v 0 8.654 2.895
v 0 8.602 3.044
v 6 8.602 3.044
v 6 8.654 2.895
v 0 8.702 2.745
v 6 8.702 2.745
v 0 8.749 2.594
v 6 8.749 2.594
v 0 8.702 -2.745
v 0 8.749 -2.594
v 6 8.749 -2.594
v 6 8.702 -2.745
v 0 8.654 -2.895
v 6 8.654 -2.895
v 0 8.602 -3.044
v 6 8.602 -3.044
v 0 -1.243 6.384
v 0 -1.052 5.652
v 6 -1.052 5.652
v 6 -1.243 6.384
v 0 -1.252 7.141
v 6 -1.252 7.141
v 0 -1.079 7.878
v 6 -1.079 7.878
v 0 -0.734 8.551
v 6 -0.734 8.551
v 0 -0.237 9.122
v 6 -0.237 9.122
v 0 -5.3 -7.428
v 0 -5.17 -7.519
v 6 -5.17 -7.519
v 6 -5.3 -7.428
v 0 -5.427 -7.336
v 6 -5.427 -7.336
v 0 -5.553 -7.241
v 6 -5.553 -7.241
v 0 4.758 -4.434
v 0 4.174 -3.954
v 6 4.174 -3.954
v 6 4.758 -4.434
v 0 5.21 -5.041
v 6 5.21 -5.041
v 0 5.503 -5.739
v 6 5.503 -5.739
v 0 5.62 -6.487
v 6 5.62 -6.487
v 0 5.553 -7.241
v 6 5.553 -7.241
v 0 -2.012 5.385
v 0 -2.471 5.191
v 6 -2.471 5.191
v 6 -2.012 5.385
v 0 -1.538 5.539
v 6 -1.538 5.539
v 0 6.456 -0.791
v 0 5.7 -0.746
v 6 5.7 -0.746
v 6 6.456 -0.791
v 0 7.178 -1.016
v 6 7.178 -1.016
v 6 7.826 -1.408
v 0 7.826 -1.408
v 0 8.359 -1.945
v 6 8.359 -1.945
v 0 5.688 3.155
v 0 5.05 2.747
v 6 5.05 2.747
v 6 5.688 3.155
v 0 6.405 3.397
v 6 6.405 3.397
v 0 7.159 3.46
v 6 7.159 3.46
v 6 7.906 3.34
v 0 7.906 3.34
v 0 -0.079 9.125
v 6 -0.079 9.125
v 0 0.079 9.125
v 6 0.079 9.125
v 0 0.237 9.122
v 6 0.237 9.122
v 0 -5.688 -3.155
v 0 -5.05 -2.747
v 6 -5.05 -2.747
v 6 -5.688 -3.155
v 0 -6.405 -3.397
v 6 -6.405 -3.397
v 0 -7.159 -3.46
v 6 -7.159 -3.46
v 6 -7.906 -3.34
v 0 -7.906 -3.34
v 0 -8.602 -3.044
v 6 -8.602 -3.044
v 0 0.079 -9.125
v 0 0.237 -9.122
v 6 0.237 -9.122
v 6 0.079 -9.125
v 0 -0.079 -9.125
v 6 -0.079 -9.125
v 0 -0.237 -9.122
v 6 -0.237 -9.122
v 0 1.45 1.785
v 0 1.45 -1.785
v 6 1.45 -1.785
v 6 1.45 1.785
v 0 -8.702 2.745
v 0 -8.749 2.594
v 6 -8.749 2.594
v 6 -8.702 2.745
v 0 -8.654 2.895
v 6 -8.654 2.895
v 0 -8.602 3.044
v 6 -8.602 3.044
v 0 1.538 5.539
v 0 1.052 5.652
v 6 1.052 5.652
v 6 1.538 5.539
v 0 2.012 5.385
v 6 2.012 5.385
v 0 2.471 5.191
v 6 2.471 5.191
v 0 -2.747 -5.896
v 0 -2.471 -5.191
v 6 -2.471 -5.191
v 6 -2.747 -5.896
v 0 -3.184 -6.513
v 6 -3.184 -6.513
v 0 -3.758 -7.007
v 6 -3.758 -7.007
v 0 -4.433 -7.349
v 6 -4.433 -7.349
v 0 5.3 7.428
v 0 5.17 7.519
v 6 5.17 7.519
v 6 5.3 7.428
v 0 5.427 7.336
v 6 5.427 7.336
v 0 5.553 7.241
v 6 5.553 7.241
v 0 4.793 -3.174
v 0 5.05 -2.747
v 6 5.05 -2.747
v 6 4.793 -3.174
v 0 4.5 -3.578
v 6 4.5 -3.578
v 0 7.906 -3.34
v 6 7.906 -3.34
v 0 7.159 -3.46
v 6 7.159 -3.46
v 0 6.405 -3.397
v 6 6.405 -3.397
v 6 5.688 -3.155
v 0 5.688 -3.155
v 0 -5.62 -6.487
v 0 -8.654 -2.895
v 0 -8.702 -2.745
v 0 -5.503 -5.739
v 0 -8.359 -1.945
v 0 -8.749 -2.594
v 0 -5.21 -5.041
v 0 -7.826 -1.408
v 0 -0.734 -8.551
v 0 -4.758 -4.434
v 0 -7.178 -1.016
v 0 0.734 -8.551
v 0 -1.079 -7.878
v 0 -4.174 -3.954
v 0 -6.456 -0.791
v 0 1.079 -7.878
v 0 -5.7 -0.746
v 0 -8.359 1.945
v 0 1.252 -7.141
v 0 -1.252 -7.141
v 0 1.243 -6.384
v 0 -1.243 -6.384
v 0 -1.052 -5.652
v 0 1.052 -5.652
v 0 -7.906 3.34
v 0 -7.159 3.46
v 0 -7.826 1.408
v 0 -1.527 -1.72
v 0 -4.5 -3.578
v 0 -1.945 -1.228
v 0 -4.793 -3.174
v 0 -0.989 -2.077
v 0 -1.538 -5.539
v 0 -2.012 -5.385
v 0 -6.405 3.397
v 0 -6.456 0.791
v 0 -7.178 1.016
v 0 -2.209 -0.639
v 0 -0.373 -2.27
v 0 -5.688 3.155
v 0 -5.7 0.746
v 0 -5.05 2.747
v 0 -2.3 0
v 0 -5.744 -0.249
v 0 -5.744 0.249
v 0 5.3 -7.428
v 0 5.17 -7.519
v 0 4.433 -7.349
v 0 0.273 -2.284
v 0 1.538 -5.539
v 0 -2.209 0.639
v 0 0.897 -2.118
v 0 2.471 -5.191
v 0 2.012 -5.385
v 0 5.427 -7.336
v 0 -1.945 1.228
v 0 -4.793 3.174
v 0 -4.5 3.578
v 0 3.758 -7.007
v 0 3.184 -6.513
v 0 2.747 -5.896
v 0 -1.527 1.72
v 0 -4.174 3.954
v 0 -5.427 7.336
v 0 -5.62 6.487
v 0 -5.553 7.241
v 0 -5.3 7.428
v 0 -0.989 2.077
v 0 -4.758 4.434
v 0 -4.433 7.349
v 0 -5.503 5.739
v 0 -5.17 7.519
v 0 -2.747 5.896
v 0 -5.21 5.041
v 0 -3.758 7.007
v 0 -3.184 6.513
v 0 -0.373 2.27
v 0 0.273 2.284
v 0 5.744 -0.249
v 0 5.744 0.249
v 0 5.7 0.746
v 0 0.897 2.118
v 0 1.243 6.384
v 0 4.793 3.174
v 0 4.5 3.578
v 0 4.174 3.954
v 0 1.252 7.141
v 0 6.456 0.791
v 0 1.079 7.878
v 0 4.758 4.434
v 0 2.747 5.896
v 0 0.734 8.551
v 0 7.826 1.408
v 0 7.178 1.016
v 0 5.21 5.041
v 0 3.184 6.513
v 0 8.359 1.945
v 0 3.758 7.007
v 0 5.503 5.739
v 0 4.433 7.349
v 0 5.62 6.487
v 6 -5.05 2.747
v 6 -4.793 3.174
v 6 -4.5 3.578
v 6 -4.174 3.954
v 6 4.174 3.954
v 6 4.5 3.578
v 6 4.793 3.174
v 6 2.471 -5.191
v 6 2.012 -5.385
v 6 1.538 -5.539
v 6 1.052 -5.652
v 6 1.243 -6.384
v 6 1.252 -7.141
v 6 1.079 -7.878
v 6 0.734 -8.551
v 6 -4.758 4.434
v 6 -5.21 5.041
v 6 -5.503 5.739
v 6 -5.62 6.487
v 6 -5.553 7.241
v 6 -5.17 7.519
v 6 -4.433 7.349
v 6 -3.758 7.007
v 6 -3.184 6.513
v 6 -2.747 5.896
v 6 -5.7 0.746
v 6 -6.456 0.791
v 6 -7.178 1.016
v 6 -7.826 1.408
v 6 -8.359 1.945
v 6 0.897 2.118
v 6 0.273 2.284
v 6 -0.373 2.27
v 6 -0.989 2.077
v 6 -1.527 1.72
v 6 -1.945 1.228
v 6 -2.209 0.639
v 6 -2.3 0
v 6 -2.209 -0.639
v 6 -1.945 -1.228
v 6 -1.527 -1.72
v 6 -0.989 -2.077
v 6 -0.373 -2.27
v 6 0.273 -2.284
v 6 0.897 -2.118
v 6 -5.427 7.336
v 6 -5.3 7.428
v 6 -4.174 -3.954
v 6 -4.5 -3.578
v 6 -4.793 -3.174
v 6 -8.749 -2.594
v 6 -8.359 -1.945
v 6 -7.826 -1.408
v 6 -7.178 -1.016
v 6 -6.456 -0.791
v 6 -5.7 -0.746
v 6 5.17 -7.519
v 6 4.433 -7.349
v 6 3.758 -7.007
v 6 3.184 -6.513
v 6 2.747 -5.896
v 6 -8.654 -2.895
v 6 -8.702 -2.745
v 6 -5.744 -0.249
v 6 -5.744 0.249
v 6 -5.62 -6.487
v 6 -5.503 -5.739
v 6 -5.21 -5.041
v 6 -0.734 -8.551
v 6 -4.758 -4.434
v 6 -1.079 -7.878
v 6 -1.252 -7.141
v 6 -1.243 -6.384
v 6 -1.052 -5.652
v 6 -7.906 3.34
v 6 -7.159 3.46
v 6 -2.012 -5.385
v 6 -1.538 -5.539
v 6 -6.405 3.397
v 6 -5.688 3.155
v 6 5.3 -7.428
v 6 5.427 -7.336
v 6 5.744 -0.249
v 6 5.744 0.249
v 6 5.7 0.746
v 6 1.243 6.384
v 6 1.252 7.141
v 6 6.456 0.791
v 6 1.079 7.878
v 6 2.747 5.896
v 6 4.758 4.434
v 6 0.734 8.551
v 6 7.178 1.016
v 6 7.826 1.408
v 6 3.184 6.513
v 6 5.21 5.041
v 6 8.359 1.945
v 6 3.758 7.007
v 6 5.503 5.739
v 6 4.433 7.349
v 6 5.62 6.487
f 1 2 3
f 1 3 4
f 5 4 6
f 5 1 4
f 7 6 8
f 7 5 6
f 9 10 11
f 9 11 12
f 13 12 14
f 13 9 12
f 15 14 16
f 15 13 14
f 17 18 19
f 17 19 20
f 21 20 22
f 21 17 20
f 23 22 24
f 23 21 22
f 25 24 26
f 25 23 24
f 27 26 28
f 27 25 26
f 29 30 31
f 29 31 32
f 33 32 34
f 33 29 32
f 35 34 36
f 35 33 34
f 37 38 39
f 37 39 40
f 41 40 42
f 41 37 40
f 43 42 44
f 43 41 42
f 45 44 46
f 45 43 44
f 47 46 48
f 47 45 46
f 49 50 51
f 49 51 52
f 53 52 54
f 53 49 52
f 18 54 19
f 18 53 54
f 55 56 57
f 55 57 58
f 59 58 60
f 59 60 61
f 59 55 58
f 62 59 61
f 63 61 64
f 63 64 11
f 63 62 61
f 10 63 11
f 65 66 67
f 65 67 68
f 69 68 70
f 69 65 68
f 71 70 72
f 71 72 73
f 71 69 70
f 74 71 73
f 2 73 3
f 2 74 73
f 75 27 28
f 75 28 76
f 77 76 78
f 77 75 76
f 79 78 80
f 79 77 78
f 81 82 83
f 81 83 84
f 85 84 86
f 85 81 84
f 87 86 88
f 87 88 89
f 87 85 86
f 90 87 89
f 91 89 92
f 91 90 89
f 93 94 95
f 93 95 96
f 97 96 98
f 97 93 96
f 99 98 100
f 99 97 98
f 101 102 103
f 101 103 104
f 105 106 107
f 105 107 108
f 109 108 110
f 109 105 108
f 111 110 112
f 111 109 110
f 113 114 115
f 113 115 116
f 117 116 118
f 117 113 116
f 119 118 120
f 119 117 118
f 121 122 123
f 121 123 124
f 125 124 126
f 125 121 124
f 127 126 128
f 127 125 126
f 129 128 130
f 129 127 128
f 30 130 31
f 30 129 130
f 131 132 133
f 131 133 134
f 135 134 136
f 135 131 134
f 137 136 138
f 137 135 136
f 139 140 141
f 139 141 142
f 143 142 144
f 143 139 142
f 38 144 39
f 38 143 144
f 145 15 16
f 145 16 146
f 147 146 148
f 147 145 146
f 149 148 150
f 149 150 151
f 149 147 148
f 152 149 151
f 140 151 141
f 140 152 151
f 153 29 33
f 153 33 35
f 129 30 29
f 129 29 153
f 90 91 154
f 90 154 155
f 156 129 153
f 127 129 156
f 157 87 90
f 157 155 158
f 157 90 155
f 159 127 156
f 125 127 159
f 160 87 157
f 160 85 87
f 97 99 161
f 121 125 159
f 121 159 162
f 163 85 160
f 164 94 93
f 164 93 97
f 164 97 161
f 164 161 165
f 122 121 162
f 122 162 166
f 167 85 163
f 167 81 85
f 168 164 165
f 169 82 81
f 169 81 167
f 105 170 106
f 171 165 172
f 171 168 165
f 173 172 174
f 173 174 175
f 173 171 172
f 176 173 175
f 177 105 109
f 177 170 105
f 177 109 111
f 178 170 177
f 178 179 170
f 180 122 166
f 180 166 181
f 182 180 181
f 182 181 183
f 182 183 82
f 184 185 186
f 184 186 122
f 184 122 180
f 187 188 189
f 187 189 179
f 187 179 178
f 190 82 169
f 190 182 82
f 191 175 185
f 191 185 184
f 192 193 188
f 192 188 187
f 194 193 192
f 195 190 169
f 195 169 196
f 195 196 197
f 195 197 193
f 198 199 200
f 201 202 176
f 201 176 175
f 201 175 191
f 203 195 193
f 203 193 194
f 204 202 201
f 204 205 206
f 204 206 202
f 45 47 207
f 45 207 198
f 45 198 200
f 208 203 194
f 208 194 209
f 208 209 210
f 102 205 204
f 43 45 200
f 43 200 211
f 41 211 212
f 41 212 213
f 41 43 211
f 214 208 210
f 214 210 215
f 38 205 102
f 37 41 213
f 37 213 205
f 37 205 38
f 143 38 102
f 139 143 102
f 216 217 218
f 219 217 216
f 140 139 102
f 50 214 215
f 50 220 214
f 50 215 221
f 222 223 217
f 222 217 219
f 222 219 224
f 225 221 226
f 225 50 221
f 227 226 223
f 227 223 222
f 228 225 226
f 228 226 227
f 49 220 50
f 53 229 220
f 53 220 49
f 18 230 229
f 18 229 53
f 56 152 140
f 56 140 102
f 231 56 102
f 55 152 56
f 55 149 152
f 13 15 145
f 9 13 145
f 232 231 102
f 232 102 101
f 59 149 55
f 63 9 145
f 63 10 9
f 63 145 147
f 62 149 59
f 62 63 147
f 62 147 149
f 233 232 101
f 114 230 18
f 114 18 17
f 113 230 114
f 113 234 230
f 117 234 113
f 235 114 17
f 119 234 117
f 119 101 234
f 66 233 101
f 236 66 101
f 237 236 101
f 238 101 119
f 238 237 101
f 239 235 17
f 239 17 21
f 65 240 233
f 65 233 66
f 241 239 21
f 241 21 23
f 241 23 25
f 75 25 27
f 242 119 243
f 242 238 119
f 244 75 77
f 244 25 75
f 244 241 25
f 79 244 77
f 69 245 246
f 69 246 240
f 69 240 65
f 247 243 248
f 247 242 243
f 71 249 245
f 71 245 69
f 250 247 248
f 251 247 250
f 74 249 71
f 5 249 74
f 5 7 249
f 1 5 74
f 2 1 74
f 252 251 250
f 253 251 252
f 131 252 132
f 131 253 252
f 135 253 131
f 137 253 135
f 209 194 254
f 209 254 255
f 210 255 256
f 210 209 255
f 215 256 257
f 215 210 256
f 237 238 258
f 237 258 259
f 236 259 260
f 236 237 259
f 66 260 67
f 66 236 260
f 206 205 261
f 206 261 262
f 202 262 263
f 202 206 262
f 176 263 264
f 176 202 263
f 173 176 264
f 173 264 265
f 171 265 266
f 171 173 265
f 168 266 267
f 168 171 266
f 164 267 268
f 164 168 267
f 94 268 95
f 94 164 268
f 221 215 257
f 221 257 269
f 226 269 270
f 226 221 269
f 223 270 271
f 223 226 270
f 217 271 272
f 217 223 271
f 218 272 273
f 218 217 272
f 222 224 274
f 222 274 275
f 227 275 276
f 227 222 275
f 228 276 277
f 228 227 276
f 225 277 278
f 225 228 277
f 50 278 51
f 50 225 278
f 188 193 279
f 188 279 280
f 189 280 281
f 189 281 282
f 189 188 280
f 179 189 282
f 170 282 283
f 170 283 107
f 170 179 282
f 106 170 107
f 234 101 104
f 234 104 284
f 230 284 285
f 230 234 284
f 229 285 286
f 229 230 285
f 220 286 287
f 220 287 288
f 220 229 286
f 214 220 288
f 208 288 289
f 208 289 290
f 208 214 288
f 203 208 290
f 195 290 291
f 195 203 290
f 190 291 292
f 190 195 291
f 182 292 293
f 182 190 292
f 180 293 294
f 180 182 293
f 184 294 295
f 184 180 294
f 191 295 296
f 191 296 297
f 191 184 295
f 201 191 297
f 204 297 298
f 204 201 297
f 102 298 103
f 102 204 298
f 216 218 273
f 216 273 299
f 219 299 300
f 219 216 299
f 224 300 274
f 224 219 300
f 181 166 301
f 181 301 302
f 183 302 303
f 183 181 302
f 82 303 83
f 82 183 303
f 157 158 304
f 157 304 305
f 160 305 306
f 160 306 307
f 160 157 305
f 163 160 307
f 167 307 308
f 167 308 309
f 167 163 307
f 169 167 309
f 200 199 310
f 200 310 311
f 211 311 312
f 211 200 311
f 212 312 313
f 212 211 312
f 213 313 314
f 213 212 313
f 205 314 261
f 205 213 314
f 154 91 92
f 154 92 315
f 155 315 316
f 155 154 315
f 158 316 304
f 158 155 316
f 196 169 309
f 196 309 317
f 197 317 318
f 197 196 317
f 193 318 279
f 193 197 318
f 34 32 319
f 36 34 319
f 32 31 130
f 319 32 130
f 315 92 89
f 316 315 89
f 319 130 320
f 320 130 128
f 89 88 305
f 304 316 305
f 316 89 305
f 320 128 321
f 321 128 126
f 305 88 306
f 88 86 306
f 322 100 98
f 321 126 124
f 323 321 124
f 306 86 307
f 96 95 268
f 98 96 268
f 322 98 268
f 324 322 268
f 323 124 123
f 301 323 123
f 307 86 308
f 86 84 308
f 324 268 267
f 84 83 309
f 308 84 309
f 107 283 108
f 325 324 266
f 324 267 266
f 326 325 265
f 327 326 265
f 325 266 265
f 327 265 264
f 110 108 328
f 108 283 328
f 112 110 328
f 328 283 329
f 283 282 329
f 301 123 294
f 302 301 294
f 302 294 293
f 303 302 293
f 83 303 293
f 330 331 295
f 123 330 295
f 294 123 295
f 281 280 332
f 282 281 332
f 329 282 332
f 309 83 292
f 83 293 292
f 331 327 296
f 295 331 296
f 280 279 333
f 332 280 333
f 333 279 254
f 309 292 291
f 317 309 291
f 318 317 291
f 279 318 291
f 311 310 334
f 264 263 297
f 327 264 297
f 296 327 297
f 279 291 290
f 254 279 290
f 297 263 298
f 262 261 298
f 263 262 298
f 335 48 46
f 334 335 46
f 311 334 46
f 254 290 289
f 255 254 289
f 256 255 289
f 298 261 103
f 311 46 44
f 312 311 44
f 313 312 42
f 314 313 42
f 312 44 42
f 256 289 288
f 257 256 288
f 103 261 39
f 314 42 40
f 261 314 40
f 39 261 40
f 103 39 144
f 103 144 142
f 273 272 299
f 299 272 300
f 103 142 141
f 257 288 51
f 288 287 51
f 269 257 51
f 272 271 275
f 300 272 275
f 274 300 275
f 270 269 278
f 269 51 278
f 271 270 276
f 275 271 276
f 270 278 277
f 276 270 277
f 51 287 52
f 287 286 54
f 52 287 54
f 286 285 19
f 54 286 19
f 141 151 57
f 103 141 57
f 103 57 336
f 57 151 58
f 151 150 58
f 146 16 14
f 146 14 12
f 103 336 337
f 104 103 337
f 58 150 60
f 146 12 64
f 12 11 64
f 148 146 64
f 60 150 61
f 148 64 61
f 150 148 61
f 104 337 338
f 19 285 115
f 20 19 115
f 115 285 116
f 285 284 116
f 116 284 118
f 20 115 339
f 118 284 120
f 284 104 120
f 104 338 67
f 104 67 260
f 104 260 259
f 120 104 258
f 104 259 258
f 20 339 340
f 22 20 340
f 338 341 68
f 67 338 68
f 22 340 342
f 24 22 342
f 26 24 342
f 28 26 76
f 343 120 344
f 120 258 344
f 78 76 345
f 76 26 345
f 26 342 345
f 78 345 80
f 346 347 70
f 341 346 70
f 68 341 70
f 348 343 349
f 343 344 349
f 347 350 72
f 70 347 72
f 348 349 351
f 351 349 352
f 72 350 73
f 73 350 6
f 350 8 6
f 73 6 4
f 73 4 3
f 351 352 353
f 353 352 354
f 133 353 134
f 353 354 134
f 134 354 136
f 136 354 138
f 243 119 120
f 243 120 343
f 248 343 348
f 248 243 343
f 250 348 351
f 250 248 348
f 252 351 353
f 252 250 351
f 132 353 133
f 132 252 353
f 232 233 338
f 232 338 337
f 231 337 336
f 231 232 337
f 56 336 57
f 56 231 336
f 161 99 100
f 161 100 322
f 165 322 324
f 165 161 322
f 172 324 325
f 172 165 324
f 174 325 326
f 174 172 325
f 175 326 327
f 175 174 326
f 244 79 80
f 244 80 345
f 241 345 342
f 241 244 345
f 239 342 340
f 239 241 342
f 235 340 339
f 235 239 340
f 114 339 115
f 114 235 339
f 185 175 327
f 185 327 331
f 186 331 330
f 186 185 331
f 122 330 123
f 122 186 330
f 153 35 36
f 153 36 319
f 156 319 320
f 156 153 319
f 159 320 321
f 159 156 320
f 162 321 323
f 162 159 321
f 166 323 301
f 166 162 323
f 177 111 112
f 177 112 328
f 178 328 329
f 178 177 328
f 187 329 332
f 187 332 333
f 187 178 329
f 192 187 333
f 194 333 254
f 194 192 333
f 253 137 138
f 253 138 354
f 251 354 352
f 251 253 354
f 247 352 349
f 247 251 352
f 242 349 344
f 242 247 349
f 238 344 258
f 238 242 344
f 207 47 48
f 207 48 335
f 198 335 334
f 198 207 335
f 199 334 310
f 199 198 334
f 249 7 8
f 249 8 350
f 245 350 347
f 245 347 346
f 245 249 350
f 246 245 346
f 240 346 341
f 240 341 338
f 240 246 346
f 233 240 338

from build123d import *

# Parameters (mm, degrees)
BASPROSKE_W         = 6
BASPROSKE_H         = 9
TOOTHCUT_DEPTH      = 15.071247279
TEETHCUTS_COUNT     = 10
TEETHCUTS_ANGLE     = 324
BORSKE_R            = 2.5
BORE_DEPTH          = 50.0000508
BOSS_EXTRUDE2_DEPTH = 6


with BuildPart() as part:
    # BasProSke → Base-Revolve (revolve)
    with BuildSketch(Plane(origin=(0, 0, 0), x_dir=(1, 0, 0), z_dir=(0, 1, 0)), mode=Mode.PRIVATE) as base_revolve_sk:
        with Locations((3, 4.5)):
            Rectangle(BASPROSKE_W, BASPROSKE_H)
    revolve(base_revolve_sk.sketch.rotate(Axis((-10, 0, 0), (1, 0, 0)), 180), axis=Axis((-10, 0, 0), (1, 0, 0)))

    # TooCutSke → ToothCut (cut, through all)
    with BuildSketch(Plane(origin=(0, 0, 0), x_dir=(0, 0, -1), z_dir=(1, 0, 0))):
        with BuildLine():
            ThreePointArc((0.883878355, 5.554109745), (0, 5.624), (-0.883878355, 5.554109745))
            ThreePointArc((-0.883878355, 5.554109745), (-1.258245767, 7.379188248), (-2.637816971, 8.631324741))
            ThreePointArc((-2.637816971, 8.631324741), (0, 9.0254), (2.637816971, 8.631324741))
            ThreePointArc((2.637816971, 8.631324741), (1.258245767, 7.379188248), (0.883878355, 5.554109745))
        make_face()
    toothcut = extrude(amount=TOOTHCUT_DEPTH, mode=Mode.SUBTRACT)

    # TeethCuts: ToothCut ×10 about axis
    teethcuts_axis = Axis((-10, 0, 0), (1, 0, 0))
    for i in range(1, TEETHCUTS_COUNT):
        add(toothcut.rotate(teethcuts_axis, i * TEETHCUTS_ANGLE / (TEETHCUTS_COUNT - 1)), mode=Mode.SUBTRACT)

    # BorSke → Bore (cut, symmetric)
    with BuildSketch(Plane(origin=(0, 0, 0), x_dir=(0, 0, -1), z_dir=(1, 0, 0))):
        with Locations(Location((0, 0, 0), (0, 0, 180))):
            Circle(BORSKE_R)
    extrude(amount=BORE_DEPTH, both=True, mode=Mode.SUBTRACT)

    # Sketch1 → Boss-Extrude2 (add)
    with BuildSketch(Plane.ZY):
        with BuildLine():
            ThreePointArc((-3.953827157, 4.173517918), (-5.381277451, 5.377958207), (-7.24074087, 5.553133949))
            ThreePointArc((-7.24074087, 5.553133949), (-7.382280074, 5.363540427), (-7.518856208, 5.170341025))
            ThreePointArc((-7.518856208, 5.170341025), (-6.777648381, 3.456018504), (-5.191051196, 2.470625119))
            ThreePointArc((-5.191051196, 2.470625119), (-5.467623912, 1.776538701), (-5.651845645, 1.052445629))
            ThreePointArc((-5.651845645, 1.052445629), (-7.51462943, 1.18782406), (-9.121932655, 0.236579037))
            ThreePointArc((-9.121932655, 0.236579037), (-9.125, 0), (-9.121932655, -0.236579037))
            ThreePointArc((-9.121932655, -0.236579037), (-7.51462943, -1.18782406), (-5.651845645, -1.052445629))
            ThreePointArc((-5.651845645, -1.052445629), (-5.467623912, -1.776538701), (-5.191051196, -2.470625119))
            ThreePointArc((-5.191051196, -2.470625119), (-6.777648381, -3.456018504), (-7.518856208, -5.170341025))
            ThreePointArc((-7.518856208, -5.170341025), (-7.382280074, -5.363540427), (-7.24074087, -5.553133949))
            ThreePointArc((-7.24074087, -5.553133949), (-5.381277451, -5.377958207), (-3.953827157, -4.173517918))
            ThreePointArc((-3.953827157, -4.173517918), (-3.379177415, -4.651038701), (-2.747451628, -5.050001045))
            ThreePointArc((-2.747451628, -5.050001045), (-3.451836013, -6.779779466), (-3.043832247, -8.60236655))
            ThreePointArc((-3.043832247, -8.60236655), (-2.819780074, -8.678390711), (-2.593832177, -8.748580436))
            ThreePointArc((-2.593832177, -8.748580436), (-1.192460387, -7.513895108), (-0.74558108, -5.700448215))
            ThreePointArc((-0.74558108, -5.700448215), (0, -5.749), (0.74558108, -5.700448215))
            ThreePointArc((0.74558108, -5.700448215), (1.192460387, -7.513895108), (2.593832177, -8.748580436))
            ThreePointArc((2.593832177, -8.748580436), (2.819780074, -8.678390711), (3.043832247, -8.60236655))
            ThreePointArc((3.043832247, -8.60236655), (3.451836013, -6.779779466), (2.747451628, -5.050001045))
            ThreePointArc((2.747451628, -5.050001045), (3.379177415, -4.651038701), (3.953827157, -4.173517918))
            ThreePointArc((3.953827157, -4.173517918), (5.381277451, -5.377958207), (7.24074087, -5.553133949))
            ThreePointArc((7.24074087, -5.553133949), (7.382280074, -5.363540427), (7.518856208, -5.170341025))
            ThreePointArc((7.518856208, -5.170341025), (6.777648381, -3.456018504), (5.191051196, -2.470625119))
            ThreePointArc((5.191051196, -2.470625119), (5.467623912, -1.776538701), (5.651845645, -1.052445629))
            ThreePointArc((5.651845645, -1.052445629), (7.51462943, -1.18782406), (9.121932655, -0.236579037))
            ThreePointArc((9.121932655, -0.236579037), (9.125, 0), (9.121932655, 0.236579037))
            ThreePointArc((9.121932655, 0.236579037), (7.51462943, 1.18782406), (5.651845645, 1.052445629))
            ThreePointArc((5.651845645, 1.052445629), (5.467623912, 1.776538701), (5.191051196, 2.470625119))
            ThreePointArc((5.191051196, 2.470625119), (6.777648381, 3.456018504), (7.518856208, 5.170341025))
            ThreePointArc((7.518856208, 5.170341025), (7.382280074, 5.363540427), (7.24074087, 5.553133949))
            ThreePointArc((7.24074087, 5.553133949), (5.381277451, 5.377958207), (3.953827157, 4.173517918))
            ThreePointArc((3.953827157, 4.173517918), (3.379177415, 4.651038701), (2.747451628, 5.050001045))
            ThreePointArc((2.747451628, 5.050001045), (3.451836013, 6.779779466), (3.043832247, 8.60236655))
            ThreePointArc((3.043832247, 8.60236655), (2.819780074, 8.678390711), (2.593832177, 8.748580436))
            ThreePointArc((2.593832177, 8.748580436), (1.192460387, 7.513895108), (0.74558108, 5.700448215))
            ThreePointArc((0.74558108, 5.700448215), (0, 5.749), (-0.74558108, 5.700448215))
            ThreePointArc((-0.74558108, 5.700448215), (-1.192460387, 7.513895108), (-2.593832177, 8.748580436))
            ThreePointArc((-2.593832177, 8.748580436), (-2.819780074, 8.678390711), (-3.043832247, 8.60236655))
            ThreePointArc((-3.043832247, 8.60236655), (-3.451836013, 6.779779466), (-2.747451628, 5.050001045))
            ThreePointArc((-2.747451628, 5.050001045), (-3.379177415, 4.651038701), (-3.953827157, 4.173517918))
        make_face()
        with BuildLine():
            Line((-1.785357107, 1.45), (1.785357107, 1.45))
            ThreePointArc((1.785357107, 1.45), (0, -2.3), (-1.785357107, 1.45))
        make_face(mode=Mode.SUBTRACT)
    extrude(amount=-BOSS_EXTRUDE2_DEPTH)


solid = part.part
